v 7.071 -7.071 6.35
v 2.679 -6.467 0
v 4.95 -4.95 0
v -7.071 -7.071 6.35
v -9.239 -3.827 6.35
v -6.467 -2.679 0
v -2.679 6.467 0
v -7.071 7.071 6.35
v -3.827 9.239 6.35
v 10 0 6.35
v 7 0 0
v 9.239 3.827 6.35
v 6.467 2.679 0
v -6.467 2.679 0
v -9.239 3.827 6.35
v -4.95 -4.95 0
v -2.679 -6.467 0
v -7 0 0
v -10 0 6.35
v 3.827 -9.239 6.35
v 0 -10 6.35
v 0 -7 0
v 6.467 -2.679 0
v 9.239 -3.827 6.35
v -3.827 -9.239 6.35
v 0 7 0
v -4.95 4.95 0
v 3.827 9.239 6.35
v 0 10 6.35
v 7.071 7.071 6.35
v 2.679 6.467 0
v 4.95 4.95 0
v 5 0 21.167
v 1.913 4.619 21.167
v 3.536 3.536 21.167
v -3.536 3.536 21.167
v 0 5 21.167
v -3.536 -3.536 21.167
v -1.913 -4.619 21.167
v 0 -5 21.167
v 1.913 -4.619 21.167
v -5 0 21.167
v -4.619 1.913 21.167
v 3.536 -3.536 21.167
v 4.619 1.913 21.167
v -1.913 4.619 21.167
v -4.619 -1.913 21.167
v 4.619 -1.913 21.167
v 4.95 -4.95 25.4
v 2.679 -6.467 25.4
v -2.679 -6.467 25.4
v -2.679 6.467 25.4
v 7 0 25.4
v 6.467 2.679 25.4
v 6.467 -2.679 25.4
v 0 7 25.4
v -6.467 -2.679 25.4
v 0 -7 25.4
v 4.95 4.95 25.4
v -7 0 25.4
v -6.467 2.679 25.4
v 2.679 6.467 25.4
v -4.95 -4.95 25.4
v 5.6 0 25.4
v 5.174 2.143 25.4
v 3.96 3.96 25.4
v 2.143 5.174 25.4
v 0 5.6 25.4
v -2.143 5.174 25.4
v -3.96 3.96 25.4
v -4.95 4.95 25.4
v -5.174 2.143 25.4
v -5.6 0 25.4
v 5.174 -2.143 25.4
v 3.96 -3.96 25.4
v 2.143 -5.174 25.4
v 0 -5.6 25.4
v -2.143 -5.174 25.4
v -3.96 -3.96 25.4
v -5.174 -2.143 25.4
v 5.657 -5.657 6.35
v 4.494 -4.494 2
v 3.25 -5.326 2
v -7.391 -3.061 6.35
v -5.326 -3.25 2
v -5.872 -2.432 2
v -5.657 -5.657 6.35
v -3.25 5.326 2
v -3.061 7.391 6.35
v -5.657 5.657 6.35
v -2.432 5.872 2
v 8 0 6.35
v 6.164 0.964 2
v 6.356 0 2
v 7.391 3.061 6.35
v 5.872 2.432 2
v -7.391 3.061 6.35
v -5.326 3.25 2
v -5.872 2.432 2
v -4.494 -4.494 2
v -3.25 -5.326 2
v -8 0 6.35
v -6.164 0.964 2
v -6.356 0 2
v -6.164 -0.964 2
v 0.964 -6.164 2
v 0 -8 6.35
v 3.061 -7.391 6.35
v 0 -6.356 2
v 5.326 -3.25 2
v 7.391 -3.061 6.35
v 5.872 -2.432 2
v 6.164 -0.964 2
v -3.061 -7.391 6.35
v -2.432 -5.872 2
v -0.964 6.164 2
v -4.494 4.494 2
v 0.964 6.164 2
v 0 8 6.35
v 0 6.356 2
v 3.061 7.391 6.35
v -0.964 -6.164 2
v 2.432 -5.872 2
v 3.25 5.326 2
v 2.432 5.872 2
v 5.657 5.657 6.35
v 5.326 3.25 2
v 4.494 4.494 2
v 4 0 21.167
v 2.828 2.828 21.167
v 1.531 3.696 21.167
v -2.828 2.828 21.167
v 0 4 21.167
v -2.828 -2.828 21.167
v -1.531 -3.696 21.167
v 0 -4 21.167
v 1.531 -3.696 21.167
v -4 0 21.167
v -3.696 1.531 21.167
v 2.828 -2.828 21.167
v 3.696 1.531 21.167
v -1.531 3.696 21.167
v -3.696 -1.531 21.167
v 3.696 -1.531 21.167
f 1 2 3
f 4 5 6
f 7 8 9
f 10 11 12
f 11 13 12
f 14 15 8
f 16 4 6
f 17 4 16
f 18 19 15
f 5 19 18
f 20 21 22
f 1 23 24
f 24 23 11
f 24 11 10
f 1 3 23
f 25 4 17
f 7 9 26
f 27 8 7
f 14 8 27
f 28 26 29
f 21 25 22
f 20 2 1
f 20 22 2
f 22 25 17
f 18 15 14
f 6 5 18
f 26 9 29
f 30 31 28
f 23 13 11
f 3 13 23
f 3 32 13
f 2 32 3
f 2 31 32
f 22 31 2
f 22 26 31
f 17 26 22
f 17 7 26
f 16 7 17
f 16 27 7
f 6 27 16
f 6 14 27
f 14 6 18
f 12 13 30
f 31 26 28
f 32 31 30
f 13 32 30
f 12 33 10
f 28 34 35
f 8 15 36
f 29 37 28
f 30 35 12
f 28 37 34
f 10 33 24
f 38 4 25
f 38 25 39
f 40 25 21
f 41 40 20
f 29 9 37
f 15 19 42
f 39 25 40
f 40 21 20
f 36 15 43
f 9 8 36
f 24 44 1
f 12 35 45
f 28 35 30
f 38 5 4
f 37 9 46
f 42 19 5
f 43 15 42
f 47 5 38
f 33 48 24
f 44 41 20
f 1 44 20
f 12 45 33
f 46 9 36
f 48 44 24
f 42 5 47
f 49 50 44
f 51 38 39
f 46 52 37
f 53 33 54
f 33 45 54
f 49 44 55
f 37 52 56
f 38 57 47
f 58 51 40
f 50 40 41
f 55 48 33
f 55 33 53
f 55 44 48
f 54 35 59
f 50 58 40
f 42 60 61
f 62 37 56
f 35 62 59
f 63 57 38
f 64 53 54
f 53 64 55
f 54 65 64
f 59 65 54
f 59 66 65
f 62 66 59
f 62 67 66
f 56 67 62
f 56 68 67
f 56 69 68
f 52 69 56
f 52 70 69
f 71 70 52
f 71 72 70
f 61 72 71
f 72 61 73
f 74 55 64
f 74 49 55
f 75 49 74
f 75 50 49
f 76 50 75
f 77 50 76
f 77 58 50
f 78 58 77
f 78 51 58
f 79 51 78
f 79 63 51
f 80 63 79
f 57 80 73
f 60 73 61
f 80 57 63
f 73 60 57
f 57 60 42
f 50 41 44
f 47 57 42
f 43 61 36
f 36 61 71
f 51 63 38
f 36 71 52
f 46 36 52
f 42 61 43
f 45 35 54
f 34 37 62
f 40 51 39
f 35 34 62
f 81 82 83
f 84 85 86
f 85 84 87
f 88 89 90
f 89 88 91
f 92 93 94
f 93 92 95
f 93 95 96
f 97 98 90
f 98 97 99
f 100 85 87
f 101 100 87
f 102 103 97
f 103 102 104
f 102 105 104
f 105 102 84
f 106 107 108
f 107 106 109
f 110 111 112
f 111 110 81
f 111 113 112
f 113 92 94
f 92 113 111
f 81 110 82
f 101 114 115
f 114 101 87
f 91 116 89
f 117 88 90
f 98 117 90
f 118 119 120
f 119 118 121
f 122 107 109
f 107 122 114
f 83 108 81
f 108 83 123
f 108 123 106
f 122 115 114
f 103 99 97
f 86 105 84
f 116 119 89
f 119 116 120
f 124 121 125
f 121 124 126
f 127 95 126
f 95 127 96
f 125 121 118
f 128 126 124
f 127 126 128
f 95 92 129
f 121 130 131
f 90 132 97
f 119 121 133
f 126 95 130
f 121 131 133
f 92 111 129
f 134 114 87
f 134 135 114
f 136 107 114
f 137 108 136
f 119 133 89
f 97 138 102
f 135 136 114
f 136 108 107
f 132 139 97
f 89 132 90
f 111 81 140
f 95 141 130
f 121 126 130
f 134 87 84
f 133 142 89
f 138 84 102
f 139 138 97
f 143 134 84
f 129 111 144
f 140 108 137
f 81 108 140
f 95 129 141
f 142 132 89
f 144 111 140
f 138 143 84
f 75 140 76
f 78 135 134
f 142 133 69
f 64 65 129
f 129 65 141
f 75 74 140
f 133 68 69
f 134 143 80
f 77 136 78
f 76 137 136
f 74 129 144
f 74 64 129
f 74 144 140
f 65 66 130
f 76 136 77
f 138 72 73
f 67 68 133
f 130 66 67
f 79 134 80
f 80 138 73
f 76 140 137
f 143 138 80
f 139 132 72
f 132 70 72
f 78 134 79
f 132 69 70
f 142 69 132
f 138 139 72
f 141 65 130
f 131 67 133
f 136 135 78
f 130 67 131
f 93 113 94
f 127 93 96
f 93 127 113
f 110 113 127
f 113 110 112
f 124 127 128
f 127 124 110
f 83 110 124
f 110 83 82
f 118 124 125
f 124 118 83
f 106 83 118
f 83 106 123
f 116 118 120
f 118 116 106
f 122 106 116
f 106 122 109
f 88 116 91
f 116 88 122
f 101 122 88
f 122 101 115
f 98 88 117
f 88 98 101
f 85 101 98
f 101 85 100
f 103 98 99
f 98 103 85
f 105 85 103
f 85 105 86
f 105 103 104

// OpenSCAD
module outside() {
    height = 25.4;
    FRAGMENTS = 16;
    cylinder(h = height*1.5/6, r1 = 7, r2=10, $fn=FRAGMENTS);
    translate([0, 0, height*1.5/6]) {
        cylinder(h = height*3.5/6, r1 = 10, r2=5, $fn=FRAGMENTS);
    }
    translate([0, 0, height*5/6]) {
        cylinder(h = height/6, r1 = 5, r2=7, $fn=FRAGMENTS);
    }
}

module inside() {

}

module vase() {
    height = 25.4;
    FRAGMENTS = 16;
    difference() {
        outside();
        difference() {
            scale(v = [.8, .8, 1]) {
                outside();
            }
            translate([-10, -10, -1]) {
                cube(size = [20, 20, 3]);
            }
        }
    }
}

vase();
